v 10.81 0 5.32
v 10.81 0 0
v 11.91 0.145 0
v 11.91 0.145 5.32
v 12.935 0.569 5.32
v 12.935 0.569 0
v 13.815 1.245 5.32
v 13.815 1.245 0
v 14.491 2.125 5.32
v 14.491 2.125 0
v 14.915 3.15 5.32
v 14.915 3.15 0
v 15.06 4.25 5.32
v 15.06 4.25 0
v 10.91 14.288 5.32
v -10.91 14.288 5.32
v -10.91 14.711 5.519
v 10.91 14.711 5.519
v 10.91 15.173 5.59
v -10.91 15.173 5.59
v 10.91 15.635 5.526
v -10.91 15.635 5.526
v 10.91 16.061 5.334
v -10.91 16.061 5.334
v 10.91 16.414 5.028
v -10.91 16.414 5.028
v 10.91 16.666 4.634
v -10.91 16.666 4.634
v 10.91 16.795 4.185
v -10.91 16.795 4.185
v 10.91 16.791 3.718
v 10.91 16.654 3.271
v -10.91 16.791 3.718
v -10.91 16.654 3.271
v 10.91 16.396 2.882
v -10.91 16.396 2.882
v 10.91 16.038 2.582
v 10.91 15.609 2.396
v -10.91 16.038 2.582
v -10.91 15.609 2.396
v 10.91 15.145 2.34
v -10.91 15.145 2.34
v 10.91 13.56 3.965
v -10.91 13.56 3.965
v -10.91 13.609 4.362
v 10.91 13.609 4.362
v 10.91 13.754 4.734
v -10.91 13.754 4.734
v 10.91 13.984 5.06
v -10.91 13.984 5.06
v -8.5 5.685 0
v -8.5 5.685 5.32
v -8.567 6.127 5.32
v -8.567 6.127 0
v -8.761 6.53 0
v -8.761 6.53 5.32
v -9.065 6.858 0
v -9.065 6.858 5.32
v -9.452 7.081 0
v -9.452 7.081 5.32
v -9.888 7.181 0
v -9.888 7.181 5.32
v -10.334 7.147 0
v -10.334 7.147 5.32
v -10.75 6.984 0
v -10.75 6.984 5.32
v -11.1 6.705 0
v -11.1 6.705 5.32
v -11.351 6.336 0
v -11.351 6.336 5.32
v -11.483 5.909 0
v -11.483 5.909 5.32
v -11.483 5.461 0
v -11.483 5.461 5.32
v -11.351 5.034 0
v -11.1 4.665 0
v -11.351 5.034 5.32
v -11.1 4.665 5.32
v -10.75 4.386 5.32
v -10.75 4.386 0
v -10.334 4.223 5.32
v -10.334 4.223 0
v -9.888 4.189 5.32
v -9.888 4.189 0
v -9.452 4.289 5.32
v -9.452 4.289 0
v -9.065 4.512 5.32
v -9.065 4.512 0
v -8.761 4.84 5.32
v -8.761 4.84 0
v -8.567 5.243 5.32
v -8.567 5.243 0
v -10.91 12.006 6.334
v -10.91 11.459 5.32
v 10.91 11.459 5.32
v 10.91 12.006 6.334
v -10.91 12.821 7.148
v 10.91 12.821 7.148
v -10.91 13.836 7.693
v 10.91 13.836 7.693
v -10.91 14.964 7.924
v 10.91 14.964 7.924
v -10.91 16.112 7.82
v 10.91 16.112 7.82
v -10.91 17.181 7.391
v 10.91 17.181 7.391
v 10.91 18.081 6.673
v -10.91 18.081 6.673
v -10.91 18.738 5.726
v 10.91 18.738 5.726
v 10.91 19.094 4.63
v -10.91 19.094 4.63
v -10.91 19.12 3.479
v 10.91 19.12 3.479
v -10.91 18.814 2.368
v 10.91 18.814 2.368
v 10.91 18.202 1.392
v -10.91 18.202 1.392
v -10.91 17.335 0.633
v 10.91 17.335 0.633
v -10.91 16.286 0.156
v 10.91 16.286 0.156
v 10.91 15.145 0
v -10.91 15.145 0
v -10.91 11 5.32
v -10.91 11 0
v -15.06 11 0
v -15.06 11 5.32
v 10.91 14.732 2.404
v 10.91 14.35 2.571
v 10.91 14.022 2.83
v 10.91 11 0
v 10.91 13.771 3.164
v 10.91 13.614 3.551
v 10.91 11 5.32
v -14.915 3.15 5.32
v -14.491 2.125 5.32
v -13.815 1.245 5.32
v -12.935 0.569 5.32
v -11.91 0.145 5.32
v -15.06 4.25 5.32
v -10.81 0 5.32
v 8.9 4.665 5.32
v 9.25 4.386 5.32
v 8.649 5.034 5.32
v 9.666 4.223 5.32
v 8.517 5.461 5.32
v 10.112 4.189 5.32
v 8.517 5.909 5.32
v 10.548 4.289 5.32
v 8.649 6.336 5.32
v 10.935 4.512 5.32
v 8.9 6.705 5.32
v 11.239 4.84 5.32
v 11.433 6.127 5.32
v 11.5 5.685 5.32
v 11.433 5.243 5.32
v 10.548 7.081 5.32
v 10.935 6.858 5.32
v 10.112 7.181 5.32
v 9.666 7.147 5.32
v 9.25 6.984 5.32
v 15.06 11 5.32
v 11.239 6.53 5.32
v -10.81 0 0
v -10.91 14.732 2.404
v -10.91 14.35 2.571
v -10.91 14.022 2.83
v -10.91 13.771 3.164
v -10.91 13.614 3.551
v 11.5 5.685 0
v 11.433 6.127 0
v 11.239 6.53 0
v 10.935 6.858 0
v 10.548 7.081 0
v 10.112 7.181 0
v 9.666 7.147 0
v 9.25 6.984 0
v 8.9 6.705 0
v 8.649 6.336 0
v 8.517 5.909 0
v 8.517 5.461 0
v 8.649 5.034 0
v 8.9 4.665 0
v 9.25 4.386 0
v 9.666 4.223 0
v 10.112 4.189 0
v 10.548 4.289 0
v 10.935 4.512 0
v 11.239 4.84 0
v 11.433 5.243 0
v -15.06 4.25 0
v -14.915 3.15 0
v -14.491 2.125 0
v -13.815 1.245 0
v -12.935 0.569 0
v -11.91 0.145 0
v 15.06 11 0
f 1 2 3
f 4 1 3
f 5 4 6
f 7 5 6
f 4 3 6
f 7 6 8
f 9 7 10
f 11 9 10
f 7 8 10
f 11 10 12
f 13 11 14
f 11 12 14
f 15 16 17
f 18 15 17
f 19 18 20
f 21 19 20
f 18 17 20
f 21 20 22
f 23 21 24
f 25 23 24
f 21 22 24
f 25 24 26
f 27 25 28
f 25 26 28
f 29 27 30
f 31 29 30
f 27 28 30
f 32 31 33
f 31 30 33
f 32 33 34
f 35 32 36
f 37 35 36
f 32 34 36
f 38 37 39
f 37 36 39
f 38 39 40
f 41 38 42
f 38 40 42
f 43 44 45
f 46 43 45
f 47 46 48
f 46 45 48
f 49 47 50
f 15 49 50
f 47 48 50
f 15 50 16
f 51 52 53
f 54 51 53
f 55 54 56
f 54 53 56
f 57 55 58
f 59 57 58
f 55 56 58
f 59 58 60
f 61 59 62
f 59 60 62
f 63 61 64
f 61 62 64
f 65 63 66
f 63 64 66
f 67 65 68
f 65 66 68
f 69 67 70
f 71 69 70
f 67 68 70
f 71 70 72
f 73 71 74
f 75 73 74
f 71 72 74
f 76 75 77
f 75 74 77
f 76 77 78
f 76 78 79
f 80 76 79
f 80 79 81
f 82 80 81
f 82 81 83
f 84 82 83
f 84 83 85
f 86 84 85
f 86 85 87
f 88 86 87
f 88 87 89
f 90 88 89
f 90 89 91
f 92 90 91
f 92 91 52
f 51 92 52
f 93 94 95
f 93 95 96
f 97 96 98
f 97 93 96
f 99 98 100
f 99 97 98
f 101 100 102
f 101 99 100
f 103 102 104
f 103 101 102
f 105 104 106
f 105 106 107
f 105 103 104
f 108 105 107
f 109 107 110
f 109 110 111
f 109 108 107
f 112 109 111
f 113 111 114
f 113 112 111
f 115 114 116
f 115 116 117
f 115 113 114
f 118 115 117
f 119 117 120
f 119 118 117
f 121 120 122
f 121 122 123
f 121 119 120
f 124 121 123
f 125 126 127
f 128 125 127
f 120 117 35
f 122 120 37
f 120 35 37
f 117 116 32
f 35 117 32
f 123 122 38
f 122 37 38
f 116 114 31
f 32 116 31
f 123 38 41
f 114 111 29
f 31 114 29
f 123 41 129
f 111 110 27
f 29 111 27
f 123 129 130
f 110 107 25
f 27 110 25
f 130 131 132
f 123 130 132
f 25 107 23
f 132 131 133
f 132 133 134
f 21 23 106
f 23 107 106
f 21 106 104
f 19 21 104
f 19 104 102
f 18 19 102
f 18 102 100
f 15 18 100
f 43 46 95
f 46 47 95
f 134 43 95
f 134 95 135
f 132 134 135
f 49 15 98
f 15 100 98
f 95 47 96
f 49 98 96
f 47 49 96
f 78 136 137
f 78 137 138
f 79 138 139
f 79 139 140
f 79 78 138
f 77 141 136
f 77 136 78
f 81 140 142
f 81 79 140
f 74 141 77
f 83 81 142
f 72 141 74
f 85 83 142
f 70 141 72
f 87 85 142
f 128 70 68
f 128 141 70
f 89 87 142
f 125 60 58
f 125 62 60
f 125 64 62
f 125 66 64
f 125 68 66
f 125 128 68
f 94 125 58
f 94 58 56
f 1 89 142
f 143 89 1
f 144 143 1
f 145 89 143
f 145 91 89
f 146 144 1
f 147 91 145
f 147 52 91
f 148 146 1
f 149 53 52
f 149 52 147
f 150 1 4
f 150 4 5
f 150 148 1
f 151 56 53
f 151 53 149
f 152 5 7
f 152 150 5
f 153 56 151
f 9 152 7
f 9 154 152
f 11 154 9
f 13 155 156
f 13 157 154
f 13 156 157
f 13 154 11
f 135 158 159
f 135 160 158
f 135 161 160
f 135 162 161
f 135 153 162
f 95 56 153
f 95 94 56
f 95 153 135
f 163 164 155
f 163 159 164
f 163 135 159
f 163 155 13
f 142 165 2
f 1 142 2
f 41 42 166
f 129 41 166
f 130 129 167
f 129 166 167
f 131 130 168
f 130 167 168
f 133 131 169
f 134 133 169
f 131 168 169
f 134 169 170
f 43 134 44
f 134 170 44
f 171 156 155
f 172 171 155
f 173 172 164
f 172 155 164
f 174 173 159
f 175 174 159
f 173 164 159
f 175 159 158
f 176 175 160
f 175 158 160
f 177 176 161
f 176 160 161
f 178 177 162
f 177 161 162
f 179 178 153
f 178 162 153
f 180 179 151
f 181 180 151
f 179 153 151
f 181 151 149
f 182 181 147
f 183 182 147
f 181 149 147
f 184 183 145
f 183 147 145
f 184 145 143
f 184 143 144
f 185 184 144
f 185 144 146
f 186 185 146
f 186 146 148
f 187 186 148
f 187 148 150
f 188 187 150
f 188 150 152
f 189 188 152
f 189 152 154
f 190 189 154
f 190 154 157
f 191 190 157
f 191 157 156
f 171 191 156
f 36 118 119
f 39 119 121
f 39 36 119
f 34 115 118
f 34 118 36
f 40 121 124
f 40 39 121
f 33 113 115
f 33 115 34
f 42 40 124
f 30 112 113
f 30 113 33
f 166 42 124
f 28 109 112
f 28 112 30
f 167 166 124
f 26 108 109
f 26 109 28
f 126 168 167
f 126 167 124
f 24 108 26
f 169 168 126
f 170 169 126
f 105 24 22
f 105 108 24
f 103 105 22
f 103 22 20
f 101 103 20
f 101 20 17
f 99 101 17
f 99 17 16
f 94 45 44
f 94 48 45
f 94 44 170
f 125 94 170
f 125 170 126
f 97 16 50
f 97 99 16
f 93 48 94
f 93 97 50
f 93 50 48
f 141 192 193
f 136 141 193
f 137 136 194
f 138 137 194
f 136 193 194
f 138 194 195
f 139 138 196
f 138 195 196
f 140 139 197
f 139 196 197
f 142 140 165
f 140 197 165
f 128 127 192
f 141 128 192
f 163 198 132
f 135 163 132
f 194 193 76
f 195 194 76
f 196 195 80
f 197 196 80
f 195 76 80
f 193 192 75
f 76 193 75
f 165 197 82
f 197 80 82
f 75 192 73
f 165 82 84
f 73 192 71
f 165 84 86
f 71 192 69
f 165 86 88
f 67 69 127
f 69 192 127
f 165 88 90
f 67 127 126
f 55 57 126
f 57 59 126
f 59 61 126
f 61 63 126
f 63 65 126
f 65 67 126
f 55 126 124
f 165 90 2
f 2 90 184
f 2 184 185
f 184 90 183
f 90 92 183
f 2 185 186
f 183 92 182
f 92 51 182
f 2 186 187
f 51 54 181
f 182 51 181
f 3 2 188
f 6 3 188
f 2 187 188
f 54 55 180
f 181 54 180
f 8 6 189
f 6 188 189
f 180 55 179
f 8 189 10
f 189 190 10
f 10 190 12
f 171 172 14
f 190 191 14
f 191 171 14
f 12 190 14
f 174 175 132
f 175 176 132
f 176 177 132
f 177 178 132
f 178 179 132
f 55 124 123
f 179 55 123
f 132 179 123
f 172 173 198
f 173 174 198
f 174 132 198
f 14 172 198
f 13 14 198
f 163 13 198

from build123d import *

# Parameters (mm, degrees)
F1_DEPTH = 5.32
F3_DEPTH = 21.82
F4_DEPTH = 25.971
F5_R     = 1.5
F6_DEPTH = 5.321


with BuildPart() as f1:
    # F0 (on Top) → F1 (new body)
    with BuildSketch(Plane.XY):
        with BuildLine():
            Line((-10.81, 0), (0, 0))
            Line((0, 0), (10.81, 0))
            ThreePointArc((10.81, 0), (13.81520382, 1.24479618), (15.06, 4.25))
            Line((15.06, 4.25), (15.06, 11))
            Line((15.06, 11), (10.91, 11))
            Line((10.91, 11), (10.91, 15.145))
            Line((10.91, 15.145), (-10.91, 15.145))
            Line((-10.91, 15.145), (-10.91, 11))
            Line((-10.91, 11), (-15.06, 11))
            Line((-15.06, 11), (-15.06, 4.25))
            ThreePointArc((-15.06, 4.25), (-13.81520382, 1.24479618), (-10.81, 0))
        make_face()
    extrude(amount=F1_DEPTH)

    # F2 (on face) → F3 (join, through all)
    with BuildSketch(Plane(origin=(-10.91, 0, 0), x_dir=(0, -1, 0), z_dir=(-1, 0, 0))):
        with BuildLine():
            Line((-14.2880050167, 5.32), (-11.4587149867, 5.32))
            ThreePointArc((-11.4587149867, 5.32), (-18.4440319116, 6.2233037881), (-15.145, 0.0002017706))
            Line((-15.145, 0.0002017706), (-15.145, 2.3404923823))
            ThreePointArc((-15.145, 2.3404923823), (-16.7466838062, 4.4141866976), (-14.2880050167, 5.32))
        make_face()
        with BuildLine():
            Line((-15.145, 5.32), (-14.2880050167, 5.32))
            ThreePointArc((-14.2880050167, 5.32), (-16.7466838062, 4.4141866976), (-15.145, 2.3404923823))
            Line((-15.145, 2.3404923823), (-15.145, 5.32))
        make_face()
    extrude(amount=-F3_DEPTH)

    # F2 (on face) → F4 (cut, through all)
    with BuildSketch(Plane(origin=(-10.91, 0, 0), x_dir=(0, -1, 0), z_dir=(-1, 0, 0))):
        with BuildLine():
            Line((-15.145, 5.32), (-14.2880050167, 5.32))
            ThreePointArc((-14.2880050167, 5.32), (-16.7466838062, 4.4141866976), (-15.145, 2.3404923823))
            Line((-15.145, 2.3404923823), (-15.145, 5.32))
        make_face()
        with BuildLine():
            ThreePointArc((-13.56, 3.965), (-13.7535249133, 4.7340930217), (-14.2880050167, 5.32))
            Line((-14.2880050167, 5.32), (-15.145, 5.32))
            Line((-15.145, 5.32), (-15.145, 2.3404923823))
            ThreePointArc((-15.145, 2.3404923823), (-14.0218953186, 2.8301817326), (-13.56, 3.965))
        make_face()
    extrude(amount=-F4_DEPTH, mode=Mode.SUBTRACT)

    # F5 (on face) → F6 (cut, through all)
    with BuildSketch(Plane.XY.offset(5.32)):
        with Locations((-10, 5.685)):
            Circle(F5_R)
        with Locations((10, 5.685)):
            Circle(F5_R)
    extrude(amount=-F6_DEPTH, mode=Mode.SUBTRACT)


solid = f1.part
